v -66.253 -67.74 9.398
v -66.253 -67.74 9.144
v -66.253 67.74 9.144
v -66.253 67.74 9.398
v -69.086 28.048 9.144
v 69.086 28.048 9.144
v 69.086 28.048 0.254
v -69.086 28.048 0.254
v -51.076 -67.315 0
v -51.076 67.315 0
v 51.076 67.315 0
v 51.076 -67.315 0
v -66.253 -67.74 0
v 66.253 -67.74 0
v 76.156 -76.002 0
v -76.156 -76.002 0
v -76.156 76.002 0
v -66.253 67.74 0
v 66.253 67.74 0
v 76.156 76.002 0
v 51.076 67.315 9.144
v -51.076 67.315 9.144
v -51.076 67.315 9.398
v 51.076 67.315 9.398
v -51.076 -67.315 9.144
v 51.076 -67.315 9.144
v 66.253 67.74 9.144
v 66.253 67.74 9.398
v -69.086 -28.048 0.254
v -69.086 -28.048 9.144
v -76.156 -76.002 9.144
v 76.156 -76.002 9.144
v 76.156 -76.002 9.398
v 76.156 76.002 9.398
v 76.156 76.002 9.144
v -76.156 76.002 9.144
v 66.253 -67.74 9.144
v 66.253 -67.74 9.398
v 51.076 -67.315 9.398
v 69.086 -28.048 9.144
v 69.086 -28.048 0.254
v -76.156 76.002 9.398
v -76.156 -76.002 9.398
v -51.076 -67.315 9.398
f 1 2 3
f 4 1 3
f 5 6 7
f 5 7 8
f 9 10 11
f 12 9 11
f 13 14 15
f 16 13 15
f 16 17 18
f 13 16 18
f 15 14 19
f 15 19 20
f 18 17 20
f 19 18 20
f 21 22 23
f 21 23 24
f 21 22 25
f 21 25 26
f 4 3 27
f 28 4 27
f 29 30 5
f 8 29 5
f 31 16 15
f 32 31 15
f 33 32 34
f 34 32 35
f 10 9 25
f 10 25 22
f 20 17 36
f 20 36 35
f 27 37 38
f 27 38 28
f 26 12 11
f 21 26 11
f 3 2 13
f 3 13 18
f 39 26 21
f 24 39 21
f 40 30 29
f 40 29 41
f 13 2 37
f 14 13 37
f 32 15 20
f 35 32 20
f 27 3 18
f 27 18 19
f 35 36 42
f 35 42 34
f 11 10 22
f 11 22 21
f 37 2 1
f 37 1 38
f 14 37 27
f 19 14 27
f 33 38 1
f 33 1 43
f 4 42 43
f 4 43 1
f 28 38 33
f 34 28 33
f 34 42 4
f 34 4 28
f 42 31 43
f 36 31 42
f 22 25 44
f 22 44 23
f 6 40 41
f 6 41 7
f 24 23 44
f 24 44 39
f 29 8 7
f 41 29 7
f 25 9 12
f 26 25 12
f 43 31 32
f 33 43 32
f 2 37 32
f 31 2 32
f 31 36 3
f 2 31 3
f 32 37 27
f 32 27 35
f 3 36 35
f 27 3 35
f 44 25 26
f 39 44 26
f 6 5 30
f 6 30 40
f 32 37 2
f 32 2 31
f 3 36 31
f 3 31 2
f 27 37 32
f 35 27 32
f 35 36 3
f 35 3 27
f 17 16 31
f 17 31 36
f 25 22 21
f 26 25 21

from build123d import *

# Parameters (mm, degrees)
F0_W     = 152.3119062185
F0_H     = 152.0035862923
F1_DEPTH = 9.144
F2_W     = 132.5059980154
F2_H     = 135.4796290398
F3_DEPTH = 25.4
F4_W     = 102.152980864
F4_H     = 134.6293836832
F5_DEPTH = 9.144
F6_W     = 18.0096440017
F6_H     = 56.0955740511
F6_W_2   = 102.152980864
F7_DEPTH = 8.89
F8_DEPTH = 0.254
F9_DEPTH = 0.254


with BuildPart() as f1:
    # F0 (on Top) → F1 (new body)
    with BuildSketch(Plane.XY):
        Rectangle(F0_W, F0_H)
    extrude(amount=F1_DEPTH)

    # F2 (on face) → F3 (cut)
    with BuildSketch(Plane.XY.offset(9.144)):
        Rectangle(F2_W, F2_H)
    extrude(amount=-F3_DEPTH, mode=Mode.SUBTRACT)


with BuildPart() as f5:
    # F4 (on Top) → F5 (new body)
    with BuildSketch(Plane.XY):
        Rectangle(F4_W, F4_H)
    extrude(amount=F5_DEPTH)


with BuildPart() as f7:
    # F6 (on face) → F7 (new body)
    with BuildSketch(Plane.XY.offset(9.144)):
        with Locations((-60.0813124329, 0)):
            Rectangle(F6_W, F6_H)
        with Locations((60.0813124329, 0)):
            Rectangle(F6_W, F6_H)
        Rectangle(F6_W_2, F6_H)
    extrude(amount=-F7_DEPTH)


with BuildPart() as f8:
    # F8 (new): a face of the model
    f8_faces = [f1.part.faces().sort_by_distance(p)[0] for p in [
        (74.0041165211, 0, 9.144),
    ]]
    extrude(f8_faces, amount=F8_DEPTH)


with BuildPart() as f9:
    # F9 (new): a face of the model
    f9_faces = [f5.part.faces().sort_by_distance(p)[0] for p in [
        (0, 0, 9.144),
    ]]
    extrude(f9_faces, amount=F9_DEPTH)


solid = Compound([f1.part, f5.part, f7.part, f8.part, f9.part])
